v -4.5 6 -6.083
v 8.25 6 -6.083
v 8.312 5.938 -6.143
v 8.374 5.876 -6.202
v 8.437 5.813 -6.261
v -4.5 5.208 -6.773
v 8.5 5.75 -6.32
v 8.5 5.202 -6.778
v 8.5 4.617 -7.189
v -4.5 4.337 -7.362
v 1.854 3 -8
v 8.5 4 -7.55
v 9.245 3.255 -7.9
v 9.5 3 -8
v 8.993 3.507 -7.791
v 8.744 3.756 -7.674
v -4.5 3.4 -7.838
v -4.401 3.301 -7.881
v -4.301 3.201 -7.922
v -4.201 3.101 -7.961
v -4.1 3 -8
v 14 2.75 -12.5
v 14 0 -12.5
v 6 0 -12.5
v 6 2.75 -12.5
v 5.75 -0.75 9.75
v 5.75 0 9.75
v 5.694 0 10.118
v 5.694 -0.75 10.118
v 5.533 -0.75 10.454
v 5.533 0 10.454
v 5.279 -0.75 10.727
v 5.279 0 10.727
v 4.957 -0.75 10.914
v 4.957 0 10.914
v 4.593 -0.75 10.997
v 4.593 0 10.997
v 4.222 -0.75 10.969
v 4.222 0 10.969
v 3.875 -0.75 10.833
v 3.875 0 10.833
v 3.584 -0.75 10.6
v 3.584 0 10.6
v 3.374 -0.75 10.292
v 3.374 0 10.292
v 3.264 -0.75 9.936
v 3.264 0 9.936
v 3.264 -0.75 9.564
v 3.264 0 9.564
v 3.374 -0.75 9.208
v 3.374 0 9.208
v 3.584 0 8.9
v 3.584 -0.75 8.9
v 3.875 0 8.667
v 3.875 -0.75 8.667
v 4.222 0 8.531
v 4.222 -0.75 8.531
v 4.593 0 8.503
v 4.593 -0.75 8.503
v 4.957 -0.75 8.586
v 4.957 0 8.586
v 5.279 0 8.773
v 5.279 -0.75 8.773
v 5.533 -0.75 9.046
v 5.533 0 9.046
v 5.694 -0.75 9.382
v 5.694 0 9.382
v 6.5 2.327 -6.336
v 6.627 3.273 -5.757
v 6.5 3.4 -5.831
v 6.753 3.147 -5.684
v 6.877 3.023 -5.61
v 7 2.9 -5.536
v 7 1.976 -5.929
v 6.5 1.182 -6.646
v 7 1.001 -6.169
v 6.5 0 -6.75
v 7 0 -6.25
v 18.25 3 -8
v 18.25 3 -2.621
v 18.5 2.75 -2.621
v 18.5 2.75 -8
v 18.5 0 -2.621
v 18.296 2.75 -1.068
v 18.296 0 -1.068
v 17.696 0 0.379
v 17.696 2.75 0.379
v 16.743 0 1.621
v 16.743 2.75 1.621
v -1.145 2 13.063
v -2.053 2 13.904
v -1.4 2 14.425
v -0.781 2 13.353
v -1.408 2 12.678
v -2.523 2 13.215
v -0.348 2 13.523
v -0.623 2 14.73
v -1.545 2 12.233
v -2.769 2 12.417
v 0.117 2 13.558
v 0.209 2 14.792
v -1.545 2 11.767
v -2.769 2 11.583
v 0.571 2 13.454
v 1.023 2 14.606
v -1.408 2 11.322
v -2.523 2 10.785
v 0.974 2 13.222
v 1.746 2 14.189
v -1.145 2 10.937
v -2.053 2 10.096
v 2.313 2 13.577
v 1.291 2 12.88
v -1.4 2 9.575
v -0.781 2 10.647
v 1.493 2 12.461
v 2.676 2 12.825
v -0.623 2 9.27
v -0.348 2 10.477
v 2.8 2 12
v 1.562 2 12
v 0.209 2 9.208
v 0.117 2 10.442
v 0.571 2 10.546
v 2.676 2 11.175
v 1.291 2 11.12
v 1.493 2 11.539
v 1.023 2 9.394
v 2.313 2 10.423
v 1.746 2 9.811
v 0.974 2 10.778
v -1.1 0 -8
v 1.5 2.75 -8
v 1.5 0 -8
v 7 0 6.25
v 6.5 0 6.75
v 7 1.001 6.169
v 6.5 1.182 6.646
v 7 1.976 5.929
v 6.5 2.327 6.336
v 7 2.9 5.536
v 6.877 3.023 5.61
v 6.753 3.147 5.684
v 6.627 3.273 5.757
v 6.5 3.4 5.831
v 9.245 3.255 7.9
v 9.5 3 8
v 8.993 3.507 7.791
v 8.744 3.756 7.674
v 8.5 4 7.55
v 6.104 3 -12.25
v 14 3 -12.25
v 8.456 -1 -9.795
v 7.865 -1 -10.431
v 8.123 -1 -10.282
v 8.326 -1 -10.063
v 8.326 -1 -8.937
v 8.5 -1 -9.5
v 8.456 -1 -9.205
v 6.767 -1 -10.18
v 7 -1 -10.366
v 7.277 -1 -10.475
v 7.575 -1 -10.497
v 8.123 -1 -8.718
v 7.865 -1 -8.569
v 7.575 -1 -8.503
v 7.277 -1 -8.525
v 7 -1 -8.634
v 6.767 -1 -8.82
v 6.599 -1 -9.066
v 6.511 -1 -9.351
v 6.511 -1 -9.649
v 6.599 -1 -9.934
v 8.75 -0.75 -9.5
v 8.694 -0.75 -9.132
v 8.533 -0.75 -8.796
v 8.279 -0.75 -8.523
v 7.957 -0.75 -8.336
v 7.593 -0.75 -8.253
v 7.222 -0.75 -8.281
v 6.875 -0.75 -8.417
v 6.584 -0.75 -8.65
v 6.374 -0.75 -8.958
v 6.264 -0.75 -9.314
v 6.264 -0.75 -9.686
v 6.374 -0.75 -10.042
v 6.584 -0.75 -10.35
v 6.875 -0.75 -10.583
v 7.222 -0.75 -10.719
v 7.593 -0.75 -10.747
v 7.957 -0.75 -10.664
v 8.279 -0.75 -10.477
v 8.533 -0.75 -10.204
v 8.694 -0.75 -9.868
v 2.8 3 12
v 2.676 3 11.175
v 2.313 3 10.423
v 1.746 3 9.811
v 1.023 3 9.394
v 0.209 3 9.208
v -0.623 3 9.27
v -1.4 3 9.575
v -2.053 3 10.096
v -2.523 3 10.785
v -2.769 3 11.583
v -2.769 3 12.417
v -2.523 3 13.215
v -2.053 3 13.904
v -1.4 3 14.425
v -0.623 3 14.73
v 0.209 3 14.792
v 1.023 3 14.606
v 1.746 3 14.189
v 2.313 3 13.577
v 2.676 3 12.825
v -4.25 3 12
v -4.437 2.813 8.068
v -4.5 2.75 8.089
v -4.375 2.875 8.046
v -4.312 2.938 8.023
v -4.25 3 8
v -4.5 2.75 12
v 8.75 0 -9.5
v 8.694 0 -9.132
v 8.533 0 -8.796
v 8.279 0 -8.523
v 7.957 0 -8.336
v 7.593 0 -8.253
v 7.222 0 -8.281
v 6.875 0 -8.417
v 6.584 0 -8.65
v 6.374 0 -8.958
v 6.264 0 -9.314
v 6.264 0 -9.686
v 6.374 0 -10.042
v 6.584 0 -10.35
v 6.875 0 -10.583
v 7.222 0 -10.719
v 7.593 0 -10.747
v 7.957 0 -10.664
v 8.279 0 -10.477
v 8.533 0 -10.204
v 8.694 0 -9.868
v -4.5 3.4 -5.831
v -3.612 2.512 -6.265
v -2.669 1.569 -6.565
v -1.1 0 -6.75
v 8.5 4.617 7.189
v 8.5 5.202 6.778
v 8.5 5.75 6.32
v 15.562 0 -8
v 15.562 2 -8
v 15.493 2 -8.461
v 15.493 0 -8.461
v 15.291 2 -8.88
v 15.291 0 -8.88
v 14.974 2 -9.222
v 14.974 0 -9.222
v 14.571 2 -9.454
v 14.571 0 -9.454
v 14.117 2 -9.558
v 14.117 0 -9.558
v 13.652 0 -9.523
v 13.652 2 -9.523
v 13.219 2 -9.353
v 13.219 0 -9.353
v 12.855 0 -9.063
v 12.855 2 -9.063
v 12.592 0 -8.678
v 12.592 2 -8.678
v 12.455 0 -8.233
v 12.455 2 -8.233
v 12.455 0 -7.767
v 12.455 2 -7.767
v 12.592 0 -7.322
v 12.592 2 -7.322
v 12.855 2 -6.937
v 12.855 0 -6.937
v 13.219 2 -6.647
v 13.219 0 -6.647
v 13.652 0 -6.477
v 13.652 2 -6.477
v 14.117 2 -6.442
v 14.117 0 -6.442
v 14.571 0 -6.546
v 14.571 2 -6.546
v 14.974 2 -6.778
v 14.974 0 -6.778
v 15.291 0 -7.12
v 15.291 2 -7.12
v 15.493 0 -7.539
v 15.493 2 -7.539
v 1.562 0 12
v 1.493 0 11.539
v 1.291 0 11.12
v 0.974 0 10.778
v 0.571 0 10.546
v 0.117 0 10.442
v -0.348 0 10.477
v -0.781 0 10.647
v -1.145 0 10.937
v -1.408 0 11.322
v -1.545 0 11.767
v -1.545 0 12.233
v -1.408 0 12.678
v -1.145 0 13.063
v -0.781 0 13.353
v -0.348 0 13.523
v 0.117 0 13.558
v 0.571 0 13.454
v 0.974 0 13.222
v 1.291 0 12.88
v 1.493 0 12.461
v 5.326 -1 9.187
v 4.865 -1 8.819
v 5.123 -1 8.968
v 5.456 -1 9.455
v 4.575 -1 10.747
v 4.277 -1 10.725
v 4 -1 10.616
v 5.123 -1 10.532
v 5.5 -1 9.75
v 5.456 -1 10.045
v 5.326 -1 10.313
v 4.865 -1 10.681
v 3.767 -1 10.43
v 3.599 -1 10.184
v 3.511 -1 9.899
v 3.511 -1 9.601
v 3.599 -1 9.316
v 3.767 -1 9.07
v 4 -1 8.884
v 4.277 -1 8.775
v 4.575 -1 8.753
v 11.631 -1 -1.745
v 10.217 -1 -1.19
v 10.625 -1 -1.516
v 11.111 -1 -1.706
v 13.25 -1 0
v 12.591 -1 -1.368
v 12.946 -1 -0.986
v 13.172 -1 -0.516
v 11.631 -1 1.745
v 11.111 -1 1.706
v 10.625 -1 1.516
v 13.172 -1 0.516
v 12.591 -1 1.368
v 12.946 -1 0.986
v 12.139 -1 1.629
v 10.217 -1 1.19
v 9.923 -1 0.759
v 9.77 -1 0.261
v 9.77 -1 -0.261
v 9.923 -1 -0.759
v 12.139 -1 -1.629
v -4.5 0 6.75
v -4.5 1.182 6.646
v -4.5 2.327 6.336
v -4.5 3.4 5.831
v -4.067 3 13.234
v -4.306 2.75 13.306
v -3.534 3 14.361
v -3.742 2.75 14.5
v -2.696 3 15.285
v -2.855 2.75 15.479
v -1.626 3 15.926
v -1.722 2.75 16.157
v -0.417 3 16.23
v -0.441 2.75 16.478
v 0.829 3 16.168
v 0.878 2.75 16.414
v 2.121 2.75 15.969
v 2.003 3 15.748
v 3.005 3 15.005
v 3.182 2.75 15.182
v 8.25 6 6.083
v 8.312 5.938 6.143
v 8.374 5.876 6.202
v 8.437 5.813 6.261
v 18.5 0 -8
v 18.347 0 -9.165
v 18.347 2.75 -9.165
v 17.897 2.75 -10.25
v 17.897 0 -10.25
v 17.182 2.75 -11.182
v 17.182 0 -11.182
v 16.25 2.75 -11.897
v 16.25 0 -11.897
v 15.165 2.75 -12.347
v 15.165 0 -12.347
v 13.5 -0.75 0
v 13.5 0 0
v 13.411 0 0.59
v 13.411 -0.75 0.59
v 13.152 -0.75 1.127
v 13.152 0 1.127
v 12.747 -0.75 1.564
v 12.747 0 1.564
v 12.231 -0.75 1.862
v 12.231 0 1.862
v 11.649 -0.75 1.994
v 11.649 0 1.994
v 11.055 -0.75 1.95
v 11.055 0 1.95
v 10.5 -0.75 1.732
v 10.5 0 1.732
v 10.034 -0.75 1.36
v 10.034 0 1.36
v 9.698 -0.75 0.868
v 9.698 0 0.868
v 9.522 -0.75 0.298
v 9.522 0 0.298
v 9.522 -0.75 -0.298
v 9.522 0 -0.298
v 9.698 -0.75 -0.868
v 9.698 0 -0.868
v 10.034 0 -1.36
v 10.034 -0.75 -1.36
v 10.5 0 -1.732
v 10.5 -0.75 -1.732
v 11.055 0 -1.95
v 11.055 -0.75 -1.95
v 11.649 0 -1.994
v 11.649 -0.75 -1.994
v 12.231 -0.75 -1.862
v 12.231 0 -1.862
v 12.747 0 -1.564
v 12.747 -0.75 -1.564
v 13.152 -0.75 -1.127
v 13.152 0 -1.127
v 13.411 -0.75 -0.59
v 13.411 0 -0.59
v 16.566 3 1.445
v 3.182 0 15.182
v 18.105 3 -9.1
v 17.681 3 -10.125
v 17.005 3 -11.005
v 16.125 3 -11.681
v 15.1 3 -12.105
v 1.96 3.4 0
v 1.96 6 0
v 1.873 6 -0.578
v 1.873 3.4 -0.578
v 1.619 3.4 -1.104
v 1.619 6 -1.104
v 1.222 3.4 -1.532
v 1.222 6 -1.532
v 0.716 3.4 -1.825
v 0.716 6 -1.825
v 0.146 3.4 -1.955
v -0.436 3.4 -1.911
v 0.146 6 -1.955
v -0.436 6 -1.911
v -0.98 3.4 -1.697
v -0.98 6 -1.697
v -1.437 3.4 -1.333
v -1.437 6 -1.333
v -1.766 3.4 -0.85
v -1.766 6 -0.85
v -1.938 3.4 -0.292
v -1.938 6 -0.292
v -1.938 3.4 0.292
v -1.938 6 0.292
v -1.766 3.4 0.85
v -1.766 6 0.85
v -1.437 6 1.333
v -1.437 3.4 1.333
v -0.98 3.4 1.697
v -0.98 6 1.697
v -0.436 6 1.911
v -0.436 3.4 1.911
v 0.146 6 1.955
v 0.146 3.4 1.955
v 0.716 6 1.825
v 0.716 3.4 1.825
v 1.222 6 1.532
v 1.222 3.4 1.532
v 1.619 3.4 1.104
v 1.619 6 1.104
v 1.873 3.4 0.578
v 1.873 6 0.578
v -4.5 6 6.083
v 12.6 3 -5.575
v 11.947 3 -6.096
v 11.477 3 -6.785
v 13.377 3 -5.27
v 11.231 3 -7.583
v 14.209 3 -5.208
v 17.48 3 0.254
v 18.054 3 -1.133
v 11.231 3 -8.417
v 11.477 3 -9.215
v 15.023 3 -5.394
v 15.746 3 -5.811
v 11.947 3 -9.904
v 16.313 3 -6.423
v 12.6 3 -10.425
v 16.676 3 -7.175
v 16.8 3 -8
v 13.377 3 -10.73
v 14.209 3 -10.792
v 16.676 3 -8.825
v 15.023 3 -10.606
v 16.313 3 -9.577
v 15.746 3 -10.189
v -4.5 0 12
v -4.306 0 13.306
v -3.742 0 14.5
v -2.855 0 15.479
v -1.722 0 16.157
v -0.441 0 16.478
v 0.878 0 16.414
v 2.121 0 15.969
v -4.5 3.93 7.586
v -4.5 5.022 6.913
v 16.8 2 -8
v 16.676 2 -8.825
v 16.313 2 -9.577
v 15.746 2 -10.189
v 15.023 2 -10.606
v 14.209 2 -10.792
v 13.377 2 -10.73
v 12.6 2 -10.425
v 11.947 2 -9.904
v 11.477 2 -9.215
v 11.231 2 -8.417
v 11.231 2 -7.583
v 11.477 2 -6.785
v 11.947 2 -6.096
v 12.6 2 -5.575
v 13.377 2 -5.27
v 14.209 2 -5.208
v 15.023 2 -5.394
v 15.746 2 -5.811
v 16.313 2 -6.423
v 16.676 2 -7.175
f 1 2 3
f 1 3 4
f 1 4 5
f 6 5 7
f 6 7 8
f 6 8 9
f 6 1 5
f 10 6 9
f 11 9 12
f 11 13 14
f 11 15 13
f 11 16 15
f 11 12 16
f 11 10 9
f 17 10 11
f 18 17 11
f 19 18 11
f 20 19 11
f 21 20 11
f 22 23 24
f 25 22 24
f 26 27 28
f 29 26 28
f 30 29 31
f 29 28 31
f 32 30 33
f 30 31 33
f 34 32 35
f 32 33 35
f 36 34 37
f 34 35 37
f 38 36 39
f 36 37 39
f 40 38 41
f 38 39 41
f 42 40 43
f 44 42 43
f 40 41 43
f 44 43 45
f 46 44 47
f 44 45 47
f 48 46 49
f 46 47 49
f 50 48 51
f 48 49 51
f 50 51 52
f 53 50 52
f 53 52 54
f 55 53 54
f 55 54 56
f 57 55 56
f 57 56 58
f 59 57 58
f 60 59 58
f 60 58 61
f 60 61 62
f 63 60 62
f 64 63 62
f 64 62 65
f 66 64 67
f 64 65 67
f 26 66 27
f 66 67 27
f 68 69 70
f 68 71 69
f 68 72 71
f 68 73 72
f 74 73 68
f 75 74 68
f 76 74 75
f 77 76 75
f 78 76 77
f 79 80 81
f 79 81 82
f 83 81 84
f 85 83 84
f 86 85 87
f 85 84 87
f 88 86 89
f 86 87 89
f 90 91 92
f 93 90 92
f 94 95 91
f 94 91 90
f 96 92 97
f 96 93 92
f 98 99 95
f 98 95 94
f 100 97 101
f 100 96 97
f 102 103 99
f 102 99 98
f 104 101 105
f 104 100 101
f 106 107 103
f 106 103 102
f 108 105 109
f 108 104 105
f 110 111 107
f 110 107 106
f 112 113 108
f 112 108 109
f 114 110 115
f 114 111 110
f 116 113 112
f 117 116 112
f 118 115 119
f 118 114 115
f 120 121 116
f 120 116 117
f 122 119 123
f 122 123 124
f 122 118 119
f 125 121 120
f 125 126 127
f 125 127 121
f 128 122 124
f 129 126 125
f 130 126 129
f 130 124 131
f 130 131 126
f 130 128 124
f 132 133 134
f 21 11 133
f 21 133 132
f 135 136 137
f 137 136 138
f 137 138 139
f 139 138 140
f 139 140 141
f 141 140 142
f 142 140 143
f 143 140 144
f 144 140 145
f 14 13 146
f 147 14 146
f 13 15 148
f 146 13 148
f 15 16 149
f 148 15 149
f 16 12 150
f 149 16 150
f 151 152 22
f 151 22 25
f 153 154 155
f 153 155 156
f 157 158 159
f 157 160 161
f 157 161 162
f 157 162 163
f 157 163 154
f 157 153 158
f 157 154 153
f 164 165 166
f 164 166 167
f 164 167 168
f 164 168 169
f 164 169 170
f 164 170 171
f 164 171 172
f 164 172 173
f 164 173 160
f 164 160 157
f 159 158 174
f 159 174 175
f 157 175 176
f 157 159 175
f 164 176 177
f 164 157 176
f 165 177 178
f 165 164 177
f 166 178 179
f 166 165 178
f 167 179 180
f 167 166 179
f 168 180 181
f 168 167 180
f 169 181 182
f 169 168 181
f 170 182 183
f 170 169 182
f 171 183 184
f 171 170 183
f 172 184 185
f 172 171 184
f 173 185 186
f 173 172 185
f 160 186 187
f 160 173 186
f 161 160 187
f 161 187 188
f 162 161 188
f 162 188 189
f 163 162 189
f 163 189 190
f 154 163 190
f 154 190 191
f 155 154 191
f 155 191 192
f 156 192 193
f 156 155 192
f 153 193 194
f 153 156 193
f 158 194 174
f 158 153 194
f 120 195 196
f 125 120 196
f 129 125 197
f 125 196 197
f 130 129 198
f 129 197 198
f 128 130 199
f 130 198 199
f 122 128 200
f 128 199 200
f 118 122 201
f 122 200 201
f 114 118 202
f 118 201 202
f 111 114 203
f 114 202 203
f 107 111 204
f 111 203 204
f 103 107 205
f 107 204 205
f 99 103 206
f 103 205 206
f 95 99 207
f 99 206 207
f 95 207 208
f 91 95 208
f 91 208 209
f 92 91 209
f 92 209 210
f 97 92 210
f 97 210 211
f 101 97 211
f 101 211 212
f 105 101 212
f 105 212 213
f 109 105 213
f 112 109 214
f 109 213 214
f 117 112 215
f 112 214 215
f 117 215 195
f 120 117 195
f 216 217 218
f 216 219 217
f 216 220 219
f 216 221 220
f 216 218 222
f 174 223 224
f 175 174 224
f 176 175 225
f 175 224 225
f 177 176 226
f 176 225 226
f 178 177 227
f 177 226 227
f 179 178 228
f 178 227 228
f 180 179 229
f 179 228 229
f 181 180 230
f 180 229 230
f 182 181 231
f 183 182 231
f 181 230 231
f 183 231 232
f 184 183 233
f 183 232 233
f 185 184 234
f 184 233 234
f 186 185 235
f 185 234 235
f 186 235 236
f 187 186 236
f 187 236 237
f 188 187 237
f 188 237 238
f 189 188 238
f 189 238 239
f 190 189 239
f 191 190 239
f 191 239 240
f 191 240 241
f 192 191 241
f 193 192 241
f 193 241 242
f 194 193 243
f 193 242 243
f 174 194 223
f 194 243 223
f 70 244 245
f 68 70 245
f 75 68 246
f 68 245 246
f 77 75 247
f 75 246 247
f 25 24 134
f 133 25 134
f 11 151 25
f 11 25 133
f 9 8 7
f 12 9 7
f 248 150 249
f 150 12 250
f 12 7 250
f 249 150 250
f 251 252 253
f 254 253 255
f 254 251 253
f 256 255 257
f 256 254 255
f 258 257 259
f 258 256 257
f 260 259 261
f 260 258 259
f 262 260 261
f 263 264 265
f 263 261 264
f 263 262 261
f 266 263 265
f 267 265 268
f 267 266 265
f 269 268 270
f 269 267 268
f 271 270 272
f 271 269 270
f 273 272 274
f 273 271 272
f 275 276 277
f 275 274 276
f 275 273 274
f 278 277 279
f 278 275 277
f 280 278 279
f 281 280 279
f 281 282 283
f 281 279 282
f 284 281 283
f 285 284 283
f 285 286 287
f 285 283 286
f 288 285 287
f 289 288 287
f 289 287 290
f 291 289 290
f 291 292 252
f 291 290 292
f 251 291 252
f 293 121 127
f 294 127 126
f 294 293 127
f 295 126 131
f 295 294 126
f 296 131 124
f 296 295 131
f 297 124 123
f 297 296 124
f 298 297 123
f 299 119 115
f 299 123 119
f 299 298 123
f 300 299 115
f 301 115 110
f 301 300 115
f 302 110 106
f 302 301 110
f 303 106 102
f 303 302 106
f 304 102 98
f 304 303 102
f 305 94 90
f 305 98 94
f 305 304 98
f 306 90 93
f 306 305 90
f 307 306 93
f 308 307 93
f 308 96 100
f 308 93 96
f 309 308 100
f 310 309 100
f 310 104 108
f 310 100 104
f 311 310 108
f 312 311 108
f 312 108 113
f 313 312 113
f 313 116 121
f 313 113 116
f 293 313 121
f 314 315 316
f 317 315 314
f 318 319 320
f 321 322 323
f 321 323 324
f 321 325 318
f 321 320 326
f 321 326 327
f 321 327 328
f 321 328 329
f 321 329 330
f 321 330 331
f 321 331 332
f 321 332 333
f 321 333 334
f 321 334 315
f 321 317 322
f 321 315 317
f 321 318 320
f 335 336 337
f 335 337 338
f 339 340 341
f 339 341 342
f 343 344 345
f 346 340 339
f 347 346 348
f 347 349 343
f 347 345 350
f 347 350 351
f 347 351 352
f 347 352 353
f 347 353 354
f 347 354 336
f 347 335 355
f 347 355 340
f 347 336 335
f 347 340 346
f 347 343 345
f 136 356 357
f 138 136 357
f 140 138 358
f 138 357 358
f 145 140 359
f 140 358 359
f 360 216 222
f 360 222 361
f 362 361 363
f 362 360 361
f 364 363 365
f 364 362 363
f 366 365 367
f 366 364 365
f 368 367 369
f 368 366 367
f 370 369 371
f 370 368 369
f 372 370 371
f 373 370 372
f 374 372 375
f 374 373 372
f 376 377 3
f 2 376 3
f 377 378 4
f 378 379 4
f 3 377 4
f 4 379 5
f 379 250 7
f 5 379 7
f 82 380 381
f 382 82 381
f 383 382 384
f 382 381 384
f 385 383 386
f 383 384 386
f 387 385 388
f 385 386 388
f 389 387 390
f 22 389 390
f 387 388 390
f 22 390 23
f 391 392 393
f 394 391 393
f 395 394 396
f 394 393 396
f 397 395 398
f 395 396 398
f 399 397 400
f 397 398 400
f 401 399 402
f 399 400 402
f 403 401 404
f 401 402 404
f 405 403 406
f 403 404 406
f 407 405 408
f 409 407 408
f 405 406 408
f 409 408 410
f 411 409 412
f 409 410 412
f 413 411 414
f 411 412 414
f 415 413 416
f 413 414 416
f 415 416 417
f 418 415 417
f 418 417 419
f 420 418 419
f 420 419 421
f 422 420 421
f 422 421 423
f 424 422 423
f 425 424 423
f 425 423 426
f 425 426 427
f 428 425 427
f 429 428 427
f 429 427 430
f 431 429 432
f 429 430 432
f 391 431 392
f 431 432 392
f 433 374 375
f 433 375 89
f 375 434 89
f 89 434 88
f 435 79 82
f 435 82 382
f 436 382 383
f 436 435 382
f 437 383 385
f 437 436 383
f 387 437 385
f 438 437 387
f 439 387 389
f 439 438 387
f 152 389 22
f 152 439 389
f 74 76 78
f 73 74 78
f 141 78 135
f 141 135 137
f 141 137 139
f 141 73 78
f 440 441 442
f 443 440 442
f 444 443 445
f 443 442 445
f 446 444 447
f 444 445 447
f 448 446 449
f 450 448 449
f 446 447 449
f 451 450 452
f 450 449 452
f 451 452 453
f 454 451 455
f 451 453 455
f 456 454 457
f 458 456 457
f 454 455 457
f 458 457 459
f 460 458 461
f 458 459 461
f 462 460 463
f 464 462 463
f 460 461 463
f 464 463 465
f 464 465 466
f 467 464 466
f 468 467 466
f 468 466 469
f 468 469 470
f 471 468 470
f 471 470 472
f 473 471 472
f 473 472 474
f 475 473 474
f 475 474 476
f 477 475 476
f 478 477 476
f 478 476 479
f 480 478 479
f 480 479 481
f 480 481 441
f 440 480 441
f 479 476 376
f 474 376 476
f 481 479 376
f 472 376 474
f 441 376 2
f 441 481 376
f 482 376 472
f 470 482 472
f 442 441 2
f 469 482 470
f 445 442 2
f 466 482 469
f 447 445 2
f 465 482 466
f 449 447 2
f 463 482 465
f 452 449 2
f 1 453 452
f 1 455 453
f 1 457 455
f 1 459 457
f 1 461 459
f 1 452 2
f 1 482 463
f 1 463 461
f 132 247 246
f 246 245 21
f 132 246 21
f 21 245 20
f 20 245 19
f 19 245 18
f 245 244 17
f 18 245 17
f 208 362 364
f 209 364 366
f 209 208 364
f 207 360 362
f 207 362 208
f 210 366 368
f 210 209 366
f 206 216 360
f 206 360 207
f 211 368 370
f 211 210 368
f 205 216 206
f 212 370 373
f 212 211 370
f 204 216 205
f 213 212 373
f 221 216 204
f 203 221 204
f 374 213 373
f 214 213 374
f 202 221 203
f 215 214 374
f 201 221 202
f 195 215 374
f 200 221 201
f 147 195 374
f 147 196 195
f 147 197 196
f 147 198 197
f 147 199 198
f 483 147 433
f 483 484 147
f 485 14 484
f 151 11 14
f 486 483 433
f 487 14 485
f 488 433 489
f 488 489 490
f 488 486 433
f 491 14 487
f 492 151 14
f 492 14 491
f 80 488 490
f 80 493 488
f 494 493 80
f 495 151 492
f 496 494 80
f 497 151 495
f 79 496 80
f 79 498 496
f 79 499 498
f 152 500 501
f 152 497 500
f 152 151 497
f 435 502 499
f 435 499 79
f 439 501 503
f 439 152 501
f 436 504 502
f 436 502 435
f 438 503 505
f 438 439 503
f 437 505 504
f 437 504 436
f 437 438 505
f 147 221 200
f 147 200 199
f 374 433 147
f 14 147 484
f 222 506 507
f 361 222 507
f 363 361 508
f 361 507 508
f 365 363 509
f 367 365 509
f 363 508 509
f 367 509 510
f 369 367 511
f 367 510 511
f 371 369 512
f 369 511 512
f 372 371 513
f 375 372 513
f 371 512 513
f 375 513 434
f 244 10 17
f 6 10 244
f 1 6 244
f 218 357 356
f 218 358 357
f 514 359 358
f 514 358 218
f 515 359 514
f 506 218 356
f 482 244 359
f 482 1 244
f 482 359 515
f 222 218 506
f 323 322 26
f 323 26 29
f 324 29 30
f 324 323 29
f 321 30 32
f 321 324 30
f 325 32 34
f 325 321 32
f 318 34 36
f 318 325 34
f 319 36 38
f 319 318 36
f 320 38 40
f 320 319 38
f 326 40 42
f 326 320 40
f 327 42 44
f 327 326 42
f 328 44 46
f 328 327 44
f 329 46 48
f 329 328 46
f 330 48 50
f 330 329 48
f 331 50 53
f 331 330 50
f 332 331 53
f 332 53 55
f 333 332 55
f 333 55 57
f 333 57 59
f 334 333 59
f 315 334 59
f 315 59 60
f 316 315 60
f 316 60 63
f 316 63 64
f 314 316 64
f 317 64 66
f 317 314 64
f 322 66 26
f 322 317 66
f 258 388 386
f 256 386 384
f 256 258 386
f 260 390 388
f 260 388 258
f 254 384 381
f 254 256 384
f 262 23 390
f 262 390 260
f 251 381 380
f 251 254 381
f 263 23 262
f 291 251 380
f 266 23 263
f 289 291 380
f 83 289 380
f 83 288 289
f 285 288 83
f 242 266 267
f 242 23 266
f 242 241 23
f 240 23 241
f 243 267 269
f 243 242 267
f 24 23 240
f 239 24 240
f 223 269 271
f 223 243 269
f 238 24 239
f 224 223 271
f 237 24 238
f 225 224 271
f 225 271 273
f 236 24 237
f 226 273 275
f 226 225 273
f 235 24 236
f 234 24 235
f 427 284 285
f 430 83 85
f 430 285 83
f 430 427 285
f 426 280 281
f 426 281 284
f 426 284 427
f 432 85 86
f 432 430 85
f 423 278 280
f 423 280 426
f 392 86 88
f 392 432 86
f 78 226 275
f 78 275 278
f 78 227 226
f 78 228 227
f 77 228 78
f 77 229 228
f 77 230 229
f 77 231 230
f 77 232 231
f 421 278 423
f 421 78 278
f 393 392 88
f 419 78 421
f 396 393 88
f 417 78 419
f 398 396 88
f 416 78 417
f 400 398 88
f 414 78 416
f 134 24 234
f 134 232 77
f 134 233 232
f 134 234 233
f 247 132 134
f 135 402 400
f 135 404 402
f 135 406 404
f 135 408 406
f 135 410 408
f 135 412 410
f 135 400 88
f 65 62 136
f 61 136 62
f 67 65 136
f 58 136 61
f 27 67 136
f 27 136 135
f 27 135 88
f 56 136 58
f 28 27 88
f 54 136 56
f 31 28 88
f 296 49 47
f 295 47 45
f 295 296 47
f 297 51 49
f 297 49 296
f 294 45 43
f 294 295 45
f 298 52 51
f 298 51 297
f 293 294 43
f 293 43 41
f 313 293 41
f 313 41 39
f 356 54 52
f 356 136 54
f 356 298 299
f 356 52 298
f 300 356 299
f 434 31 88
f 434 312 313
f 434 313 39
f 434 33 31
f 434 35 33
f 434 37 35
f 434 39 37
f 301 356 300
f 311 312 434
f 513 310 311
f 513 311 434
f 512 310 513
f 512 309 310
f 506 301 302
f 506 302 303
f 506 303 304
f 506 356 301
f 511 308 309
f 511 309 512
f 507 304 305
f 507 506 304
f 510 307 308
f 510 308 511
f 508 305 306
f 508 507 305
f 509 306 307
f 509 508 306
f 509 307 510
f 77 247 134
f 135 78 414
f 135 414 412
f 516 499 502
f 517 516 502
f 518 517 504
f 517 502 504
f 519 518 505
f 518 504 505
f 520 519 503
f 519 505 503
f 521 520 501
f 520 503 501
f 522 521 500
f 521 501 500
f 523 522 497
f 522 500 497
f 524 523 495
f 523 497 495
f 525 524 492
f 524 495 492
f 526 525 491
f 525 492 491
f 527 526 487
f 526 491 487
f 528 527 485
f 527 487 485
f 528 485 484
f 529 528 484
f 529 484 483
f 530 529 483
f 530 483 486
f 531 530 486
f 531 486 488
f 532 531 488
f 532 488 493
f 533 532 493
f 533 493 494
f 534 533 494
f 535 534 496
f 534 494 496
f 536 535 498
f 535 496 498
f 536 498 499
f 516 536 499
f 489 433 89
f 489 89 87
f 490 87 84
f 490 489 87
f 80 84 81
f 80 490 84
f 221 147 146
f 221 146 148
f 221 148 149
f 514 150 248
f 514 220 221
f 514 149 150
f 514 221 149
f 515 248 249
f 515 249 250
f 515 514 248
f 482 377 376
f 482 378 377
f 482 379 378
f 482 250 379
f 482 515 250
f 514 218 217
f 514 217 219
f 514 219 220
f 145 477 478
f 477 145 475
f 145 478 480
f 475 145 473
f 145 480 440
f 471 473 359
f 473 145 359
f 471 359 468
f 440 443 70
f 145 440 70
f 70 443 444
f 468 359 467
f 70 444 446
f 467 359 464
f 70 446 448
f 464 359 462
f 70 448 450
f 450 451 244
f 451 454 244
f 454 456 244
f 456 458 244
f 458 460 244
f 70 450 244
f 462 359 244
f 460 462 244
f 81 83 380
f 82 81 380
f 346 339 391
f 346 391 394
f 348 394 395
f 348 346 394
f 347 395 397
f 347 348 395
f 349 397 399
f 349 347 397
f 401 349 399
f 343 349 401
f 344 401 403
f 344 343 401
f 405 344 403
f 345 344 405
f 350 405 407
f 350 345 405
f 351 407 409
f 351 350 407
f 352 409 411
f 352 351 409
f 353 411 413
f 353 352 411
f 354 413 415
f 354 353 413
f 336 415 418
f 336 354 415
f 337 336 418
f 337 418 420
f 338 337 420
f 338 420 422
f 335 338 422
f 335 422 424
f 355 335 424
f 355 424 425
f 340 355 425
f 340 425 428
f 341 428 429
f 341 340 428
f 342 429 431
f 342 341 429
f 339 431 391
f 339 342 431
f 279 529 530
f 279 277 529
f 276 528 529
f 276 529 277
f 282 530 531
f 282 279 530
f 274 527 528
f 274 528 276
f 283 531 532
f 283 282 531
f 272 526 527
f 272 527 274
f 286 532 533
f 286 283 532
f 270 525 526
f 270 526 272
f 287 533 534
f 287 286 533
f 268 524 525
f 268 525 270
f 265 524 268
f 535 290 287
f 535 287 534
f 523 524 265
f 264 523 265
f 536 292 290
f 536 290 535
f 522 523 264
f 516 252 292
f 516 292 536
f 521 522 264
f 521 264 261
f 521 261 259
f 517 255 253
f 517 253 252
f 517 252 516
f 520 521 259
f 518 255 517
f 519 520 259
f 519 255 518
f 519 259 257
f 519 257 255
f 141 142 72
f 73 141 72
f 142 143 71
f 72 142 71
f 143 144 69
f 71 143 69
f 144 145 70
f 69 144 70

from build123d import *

# Parameters (mm, degrees)
SKETCH1_R           = 1.5625
BOSS_EXTRUDE1_DEPTH = 3
BOSS_EXTRUDE2_DEPTH = 13
CUT_EXTRUDE1_DEPTH  = 11.5
SKETCH4_R           = 1.96
CUT_EXTRUDE2_DEPTH  = 7
CHAMFER1_SIZE       = 1
FILLET1_R           = 6
CHAMFER2_SIZE       = 3.4
CHAMFER3_SIZE       = 0.5
SKETCH5_R           = 2.8
CUT_EXTRUDE3_DEPTH  = 1
SKETCH6_R           = 1.25
SKETCH6_R_2         = 2
BOSS_EXTRUDE3_DEPTH = 1
CHAMFER4_SIZE       = 0.25


with BuildPart() as part:
    # Sketch1 → Boss-Extrude1 (new body)
    with BuildSketch(Plane(origin=(0, 0, 0), x_dir=(1, 0, 0), z_dir=(0, 1, 0))):
        with BuildLine():
            Line((3.181980515, -15.181980515), (18.5, 0.136038969))
            Line((18.5, 0.136038969), (18.5, 8))
            ThreePointArc((18.5, 8), (17.181980515, 11.181980515), (14, 12.5))
            Line((14, 12.5), (6, 12.5))
            Line((6, 12.5), (1, 7.5))
            Line((1, 7.5), (-4.5, 2))
            Line((-4.5, 2), (-4.5, -6.5))
            Line((-4.5, -6.5), (-4.5, -12))
            ThreePointArc((-4.5, -12), (-1.722075446, -16.157457896), (3.181980515, -15.181980515))
        make_face()
        with Locations((0, -12)):
            Circle(SKETCH1_R, mode=Mode.SUBTRACT)
        with Locations((14, 8)):
            Circle(SKETCH1_R, mode=Mode.SUBTRACT)
    extrude(amount=BOSS_EXTRUDE1_DEPTH)

    # Sketch2 → Boss-Extrude2 (add)
    with BuildSketch(Plane.ZY.offset(4.5)):
        with BuildLine():
            Line((-8, 0), (8, 0))
            Line((8, 0), (8, 3))
            ThreePointArc((8, 3), (7.199378454, 4.60097271), (6.08276253, 6))
            Line((6.08276253, 6), (-6.08276253, 6))
            ThreePointArc((-6.08276253, 6), (-7.199378454, 4.60097271), (-8, 3))
            Line((-8, 3), (-8, 0))
        make_face()
    extrude(amount=-BOSS_EXTRUDE2_DEPTH)

    # Sketch3 → Cut-Extrude1 (cut)
    with BuildSketch(Plane.ZY.offset(4.5)):
        with BuildLine():
            Line((-6.75, 0), (6.75, 0))
            ThreePointArc((6.75, 0), (6.516244021, 1.760983776), (5.831166264, 3.4))
            Line((5.831166264, 3.4), (-5.831166264, 3.4))
            ThreePointArc((-5.831166264, 3.4), (-6.516244021, 1.760983776), (-6.75, 0))
        make_face()
    extrude(amount=-CUT_EXTRUDE1_DEPTH, mode=Mode.SUBTRACT)

    # Sketch4 → Cut-Extrude2 (cut, through all)
    with BuildSketch(Plane(origin=(0, 6, 0), x_dir=(1, 0, 0), z_dir=(0, 1, 0))):
        Circle(SKETCH4_R)
    extrude(amount=-CUT_EXTRUDE2_DEPTH, mode=Mode.SUBTRACT)

    # Chamfer1
    chamfer1_edges = [part.edges().sort_by_distance(p)[0] for p in [
        (8.5, 3, 0),
    ]]
    chamfer(chamfer1_edges, length=CHAMFER1_SIZE)

    # Fillet1
    fillet1_edges = [part.edges().sort_by_distance(p)[0] for p in [
        (18.5, 1.5, -0.136038969),
    ]]
    fillet(fillet1_edges, radius=FILLET1_R)

    # Chamfer2
    chamfer2_edges = [part.edges().sort_by_distance(p)[0] for p in [
        (-4.5, 0, -7.375),
    ]]
    chamfer(chamfer2_edges, length=CHAMFER2_SIZE)

    # Chamfer3
    chamfer3_edges = [part.edges().sort_by_distance(p)[0] for p in [
        (7, 1.760983776, -6.516244021),
        (7, 3.4, 0),
        (7, 1.760983776, 6.516244021),
    ]]
    chamfer(chamfer3_edges, length=CHAMFER3_SIZE)

    # Sketch5 → Cut-Extrude3 (cut)
    with BuildSketch(Plane(origin=(0, 3, 0), x_dir=(1, 0, 0), z_dir=(0, 1, 0))):
        with Locations((0, -12)):
            Circle(SKETCH5_R)
        with Locations((14, 8)):
            Circle(SKETCH5_R)
    extrude(amount=-CUT_EXTRUDE3_DEPTH, mode=Mode.SUBTRACT)

    # Sketch6 → Boss-Extrude3 (add)
    with BuildSketch(Plane.XZ):
        with Locations((4.5, 9.75)):
            Circle(SKETCH6_R)
        with Locations((11.5, 0)):
            Circle(SKETCH6_R_2)
        with Locations((7.5, -9.5)):
            Circle(SKETCH6_R)
    extrude(amount=BOSS_EXTRUDE3_DEPTH)

    # Chamfer4
    chamfer4_edges = [part.edges().sort_by_distance(p)[0] for p in [
        (-1.722075446, 3, 16.157457896),
        (3.25, -1, 9.75),
        (9.5, -1, 0),
        (6.25, -1, -9.5),
        (9.962310601, 3, 8.401650429),
        (17.181980515, 3, -11.181980515),
        (10, 3, -12.5),
        (-4.5, 3, 10),
        (3.75, 3, -10.25),
        (8.5, 6, 0),
        (18.5, 3, -5.310660172),
        (18.043277195, 3, -0.325219749),
    ]]
    chamfer(chamfer4_edges, length=CHAMFER4_SIZE)


solid = part.part
